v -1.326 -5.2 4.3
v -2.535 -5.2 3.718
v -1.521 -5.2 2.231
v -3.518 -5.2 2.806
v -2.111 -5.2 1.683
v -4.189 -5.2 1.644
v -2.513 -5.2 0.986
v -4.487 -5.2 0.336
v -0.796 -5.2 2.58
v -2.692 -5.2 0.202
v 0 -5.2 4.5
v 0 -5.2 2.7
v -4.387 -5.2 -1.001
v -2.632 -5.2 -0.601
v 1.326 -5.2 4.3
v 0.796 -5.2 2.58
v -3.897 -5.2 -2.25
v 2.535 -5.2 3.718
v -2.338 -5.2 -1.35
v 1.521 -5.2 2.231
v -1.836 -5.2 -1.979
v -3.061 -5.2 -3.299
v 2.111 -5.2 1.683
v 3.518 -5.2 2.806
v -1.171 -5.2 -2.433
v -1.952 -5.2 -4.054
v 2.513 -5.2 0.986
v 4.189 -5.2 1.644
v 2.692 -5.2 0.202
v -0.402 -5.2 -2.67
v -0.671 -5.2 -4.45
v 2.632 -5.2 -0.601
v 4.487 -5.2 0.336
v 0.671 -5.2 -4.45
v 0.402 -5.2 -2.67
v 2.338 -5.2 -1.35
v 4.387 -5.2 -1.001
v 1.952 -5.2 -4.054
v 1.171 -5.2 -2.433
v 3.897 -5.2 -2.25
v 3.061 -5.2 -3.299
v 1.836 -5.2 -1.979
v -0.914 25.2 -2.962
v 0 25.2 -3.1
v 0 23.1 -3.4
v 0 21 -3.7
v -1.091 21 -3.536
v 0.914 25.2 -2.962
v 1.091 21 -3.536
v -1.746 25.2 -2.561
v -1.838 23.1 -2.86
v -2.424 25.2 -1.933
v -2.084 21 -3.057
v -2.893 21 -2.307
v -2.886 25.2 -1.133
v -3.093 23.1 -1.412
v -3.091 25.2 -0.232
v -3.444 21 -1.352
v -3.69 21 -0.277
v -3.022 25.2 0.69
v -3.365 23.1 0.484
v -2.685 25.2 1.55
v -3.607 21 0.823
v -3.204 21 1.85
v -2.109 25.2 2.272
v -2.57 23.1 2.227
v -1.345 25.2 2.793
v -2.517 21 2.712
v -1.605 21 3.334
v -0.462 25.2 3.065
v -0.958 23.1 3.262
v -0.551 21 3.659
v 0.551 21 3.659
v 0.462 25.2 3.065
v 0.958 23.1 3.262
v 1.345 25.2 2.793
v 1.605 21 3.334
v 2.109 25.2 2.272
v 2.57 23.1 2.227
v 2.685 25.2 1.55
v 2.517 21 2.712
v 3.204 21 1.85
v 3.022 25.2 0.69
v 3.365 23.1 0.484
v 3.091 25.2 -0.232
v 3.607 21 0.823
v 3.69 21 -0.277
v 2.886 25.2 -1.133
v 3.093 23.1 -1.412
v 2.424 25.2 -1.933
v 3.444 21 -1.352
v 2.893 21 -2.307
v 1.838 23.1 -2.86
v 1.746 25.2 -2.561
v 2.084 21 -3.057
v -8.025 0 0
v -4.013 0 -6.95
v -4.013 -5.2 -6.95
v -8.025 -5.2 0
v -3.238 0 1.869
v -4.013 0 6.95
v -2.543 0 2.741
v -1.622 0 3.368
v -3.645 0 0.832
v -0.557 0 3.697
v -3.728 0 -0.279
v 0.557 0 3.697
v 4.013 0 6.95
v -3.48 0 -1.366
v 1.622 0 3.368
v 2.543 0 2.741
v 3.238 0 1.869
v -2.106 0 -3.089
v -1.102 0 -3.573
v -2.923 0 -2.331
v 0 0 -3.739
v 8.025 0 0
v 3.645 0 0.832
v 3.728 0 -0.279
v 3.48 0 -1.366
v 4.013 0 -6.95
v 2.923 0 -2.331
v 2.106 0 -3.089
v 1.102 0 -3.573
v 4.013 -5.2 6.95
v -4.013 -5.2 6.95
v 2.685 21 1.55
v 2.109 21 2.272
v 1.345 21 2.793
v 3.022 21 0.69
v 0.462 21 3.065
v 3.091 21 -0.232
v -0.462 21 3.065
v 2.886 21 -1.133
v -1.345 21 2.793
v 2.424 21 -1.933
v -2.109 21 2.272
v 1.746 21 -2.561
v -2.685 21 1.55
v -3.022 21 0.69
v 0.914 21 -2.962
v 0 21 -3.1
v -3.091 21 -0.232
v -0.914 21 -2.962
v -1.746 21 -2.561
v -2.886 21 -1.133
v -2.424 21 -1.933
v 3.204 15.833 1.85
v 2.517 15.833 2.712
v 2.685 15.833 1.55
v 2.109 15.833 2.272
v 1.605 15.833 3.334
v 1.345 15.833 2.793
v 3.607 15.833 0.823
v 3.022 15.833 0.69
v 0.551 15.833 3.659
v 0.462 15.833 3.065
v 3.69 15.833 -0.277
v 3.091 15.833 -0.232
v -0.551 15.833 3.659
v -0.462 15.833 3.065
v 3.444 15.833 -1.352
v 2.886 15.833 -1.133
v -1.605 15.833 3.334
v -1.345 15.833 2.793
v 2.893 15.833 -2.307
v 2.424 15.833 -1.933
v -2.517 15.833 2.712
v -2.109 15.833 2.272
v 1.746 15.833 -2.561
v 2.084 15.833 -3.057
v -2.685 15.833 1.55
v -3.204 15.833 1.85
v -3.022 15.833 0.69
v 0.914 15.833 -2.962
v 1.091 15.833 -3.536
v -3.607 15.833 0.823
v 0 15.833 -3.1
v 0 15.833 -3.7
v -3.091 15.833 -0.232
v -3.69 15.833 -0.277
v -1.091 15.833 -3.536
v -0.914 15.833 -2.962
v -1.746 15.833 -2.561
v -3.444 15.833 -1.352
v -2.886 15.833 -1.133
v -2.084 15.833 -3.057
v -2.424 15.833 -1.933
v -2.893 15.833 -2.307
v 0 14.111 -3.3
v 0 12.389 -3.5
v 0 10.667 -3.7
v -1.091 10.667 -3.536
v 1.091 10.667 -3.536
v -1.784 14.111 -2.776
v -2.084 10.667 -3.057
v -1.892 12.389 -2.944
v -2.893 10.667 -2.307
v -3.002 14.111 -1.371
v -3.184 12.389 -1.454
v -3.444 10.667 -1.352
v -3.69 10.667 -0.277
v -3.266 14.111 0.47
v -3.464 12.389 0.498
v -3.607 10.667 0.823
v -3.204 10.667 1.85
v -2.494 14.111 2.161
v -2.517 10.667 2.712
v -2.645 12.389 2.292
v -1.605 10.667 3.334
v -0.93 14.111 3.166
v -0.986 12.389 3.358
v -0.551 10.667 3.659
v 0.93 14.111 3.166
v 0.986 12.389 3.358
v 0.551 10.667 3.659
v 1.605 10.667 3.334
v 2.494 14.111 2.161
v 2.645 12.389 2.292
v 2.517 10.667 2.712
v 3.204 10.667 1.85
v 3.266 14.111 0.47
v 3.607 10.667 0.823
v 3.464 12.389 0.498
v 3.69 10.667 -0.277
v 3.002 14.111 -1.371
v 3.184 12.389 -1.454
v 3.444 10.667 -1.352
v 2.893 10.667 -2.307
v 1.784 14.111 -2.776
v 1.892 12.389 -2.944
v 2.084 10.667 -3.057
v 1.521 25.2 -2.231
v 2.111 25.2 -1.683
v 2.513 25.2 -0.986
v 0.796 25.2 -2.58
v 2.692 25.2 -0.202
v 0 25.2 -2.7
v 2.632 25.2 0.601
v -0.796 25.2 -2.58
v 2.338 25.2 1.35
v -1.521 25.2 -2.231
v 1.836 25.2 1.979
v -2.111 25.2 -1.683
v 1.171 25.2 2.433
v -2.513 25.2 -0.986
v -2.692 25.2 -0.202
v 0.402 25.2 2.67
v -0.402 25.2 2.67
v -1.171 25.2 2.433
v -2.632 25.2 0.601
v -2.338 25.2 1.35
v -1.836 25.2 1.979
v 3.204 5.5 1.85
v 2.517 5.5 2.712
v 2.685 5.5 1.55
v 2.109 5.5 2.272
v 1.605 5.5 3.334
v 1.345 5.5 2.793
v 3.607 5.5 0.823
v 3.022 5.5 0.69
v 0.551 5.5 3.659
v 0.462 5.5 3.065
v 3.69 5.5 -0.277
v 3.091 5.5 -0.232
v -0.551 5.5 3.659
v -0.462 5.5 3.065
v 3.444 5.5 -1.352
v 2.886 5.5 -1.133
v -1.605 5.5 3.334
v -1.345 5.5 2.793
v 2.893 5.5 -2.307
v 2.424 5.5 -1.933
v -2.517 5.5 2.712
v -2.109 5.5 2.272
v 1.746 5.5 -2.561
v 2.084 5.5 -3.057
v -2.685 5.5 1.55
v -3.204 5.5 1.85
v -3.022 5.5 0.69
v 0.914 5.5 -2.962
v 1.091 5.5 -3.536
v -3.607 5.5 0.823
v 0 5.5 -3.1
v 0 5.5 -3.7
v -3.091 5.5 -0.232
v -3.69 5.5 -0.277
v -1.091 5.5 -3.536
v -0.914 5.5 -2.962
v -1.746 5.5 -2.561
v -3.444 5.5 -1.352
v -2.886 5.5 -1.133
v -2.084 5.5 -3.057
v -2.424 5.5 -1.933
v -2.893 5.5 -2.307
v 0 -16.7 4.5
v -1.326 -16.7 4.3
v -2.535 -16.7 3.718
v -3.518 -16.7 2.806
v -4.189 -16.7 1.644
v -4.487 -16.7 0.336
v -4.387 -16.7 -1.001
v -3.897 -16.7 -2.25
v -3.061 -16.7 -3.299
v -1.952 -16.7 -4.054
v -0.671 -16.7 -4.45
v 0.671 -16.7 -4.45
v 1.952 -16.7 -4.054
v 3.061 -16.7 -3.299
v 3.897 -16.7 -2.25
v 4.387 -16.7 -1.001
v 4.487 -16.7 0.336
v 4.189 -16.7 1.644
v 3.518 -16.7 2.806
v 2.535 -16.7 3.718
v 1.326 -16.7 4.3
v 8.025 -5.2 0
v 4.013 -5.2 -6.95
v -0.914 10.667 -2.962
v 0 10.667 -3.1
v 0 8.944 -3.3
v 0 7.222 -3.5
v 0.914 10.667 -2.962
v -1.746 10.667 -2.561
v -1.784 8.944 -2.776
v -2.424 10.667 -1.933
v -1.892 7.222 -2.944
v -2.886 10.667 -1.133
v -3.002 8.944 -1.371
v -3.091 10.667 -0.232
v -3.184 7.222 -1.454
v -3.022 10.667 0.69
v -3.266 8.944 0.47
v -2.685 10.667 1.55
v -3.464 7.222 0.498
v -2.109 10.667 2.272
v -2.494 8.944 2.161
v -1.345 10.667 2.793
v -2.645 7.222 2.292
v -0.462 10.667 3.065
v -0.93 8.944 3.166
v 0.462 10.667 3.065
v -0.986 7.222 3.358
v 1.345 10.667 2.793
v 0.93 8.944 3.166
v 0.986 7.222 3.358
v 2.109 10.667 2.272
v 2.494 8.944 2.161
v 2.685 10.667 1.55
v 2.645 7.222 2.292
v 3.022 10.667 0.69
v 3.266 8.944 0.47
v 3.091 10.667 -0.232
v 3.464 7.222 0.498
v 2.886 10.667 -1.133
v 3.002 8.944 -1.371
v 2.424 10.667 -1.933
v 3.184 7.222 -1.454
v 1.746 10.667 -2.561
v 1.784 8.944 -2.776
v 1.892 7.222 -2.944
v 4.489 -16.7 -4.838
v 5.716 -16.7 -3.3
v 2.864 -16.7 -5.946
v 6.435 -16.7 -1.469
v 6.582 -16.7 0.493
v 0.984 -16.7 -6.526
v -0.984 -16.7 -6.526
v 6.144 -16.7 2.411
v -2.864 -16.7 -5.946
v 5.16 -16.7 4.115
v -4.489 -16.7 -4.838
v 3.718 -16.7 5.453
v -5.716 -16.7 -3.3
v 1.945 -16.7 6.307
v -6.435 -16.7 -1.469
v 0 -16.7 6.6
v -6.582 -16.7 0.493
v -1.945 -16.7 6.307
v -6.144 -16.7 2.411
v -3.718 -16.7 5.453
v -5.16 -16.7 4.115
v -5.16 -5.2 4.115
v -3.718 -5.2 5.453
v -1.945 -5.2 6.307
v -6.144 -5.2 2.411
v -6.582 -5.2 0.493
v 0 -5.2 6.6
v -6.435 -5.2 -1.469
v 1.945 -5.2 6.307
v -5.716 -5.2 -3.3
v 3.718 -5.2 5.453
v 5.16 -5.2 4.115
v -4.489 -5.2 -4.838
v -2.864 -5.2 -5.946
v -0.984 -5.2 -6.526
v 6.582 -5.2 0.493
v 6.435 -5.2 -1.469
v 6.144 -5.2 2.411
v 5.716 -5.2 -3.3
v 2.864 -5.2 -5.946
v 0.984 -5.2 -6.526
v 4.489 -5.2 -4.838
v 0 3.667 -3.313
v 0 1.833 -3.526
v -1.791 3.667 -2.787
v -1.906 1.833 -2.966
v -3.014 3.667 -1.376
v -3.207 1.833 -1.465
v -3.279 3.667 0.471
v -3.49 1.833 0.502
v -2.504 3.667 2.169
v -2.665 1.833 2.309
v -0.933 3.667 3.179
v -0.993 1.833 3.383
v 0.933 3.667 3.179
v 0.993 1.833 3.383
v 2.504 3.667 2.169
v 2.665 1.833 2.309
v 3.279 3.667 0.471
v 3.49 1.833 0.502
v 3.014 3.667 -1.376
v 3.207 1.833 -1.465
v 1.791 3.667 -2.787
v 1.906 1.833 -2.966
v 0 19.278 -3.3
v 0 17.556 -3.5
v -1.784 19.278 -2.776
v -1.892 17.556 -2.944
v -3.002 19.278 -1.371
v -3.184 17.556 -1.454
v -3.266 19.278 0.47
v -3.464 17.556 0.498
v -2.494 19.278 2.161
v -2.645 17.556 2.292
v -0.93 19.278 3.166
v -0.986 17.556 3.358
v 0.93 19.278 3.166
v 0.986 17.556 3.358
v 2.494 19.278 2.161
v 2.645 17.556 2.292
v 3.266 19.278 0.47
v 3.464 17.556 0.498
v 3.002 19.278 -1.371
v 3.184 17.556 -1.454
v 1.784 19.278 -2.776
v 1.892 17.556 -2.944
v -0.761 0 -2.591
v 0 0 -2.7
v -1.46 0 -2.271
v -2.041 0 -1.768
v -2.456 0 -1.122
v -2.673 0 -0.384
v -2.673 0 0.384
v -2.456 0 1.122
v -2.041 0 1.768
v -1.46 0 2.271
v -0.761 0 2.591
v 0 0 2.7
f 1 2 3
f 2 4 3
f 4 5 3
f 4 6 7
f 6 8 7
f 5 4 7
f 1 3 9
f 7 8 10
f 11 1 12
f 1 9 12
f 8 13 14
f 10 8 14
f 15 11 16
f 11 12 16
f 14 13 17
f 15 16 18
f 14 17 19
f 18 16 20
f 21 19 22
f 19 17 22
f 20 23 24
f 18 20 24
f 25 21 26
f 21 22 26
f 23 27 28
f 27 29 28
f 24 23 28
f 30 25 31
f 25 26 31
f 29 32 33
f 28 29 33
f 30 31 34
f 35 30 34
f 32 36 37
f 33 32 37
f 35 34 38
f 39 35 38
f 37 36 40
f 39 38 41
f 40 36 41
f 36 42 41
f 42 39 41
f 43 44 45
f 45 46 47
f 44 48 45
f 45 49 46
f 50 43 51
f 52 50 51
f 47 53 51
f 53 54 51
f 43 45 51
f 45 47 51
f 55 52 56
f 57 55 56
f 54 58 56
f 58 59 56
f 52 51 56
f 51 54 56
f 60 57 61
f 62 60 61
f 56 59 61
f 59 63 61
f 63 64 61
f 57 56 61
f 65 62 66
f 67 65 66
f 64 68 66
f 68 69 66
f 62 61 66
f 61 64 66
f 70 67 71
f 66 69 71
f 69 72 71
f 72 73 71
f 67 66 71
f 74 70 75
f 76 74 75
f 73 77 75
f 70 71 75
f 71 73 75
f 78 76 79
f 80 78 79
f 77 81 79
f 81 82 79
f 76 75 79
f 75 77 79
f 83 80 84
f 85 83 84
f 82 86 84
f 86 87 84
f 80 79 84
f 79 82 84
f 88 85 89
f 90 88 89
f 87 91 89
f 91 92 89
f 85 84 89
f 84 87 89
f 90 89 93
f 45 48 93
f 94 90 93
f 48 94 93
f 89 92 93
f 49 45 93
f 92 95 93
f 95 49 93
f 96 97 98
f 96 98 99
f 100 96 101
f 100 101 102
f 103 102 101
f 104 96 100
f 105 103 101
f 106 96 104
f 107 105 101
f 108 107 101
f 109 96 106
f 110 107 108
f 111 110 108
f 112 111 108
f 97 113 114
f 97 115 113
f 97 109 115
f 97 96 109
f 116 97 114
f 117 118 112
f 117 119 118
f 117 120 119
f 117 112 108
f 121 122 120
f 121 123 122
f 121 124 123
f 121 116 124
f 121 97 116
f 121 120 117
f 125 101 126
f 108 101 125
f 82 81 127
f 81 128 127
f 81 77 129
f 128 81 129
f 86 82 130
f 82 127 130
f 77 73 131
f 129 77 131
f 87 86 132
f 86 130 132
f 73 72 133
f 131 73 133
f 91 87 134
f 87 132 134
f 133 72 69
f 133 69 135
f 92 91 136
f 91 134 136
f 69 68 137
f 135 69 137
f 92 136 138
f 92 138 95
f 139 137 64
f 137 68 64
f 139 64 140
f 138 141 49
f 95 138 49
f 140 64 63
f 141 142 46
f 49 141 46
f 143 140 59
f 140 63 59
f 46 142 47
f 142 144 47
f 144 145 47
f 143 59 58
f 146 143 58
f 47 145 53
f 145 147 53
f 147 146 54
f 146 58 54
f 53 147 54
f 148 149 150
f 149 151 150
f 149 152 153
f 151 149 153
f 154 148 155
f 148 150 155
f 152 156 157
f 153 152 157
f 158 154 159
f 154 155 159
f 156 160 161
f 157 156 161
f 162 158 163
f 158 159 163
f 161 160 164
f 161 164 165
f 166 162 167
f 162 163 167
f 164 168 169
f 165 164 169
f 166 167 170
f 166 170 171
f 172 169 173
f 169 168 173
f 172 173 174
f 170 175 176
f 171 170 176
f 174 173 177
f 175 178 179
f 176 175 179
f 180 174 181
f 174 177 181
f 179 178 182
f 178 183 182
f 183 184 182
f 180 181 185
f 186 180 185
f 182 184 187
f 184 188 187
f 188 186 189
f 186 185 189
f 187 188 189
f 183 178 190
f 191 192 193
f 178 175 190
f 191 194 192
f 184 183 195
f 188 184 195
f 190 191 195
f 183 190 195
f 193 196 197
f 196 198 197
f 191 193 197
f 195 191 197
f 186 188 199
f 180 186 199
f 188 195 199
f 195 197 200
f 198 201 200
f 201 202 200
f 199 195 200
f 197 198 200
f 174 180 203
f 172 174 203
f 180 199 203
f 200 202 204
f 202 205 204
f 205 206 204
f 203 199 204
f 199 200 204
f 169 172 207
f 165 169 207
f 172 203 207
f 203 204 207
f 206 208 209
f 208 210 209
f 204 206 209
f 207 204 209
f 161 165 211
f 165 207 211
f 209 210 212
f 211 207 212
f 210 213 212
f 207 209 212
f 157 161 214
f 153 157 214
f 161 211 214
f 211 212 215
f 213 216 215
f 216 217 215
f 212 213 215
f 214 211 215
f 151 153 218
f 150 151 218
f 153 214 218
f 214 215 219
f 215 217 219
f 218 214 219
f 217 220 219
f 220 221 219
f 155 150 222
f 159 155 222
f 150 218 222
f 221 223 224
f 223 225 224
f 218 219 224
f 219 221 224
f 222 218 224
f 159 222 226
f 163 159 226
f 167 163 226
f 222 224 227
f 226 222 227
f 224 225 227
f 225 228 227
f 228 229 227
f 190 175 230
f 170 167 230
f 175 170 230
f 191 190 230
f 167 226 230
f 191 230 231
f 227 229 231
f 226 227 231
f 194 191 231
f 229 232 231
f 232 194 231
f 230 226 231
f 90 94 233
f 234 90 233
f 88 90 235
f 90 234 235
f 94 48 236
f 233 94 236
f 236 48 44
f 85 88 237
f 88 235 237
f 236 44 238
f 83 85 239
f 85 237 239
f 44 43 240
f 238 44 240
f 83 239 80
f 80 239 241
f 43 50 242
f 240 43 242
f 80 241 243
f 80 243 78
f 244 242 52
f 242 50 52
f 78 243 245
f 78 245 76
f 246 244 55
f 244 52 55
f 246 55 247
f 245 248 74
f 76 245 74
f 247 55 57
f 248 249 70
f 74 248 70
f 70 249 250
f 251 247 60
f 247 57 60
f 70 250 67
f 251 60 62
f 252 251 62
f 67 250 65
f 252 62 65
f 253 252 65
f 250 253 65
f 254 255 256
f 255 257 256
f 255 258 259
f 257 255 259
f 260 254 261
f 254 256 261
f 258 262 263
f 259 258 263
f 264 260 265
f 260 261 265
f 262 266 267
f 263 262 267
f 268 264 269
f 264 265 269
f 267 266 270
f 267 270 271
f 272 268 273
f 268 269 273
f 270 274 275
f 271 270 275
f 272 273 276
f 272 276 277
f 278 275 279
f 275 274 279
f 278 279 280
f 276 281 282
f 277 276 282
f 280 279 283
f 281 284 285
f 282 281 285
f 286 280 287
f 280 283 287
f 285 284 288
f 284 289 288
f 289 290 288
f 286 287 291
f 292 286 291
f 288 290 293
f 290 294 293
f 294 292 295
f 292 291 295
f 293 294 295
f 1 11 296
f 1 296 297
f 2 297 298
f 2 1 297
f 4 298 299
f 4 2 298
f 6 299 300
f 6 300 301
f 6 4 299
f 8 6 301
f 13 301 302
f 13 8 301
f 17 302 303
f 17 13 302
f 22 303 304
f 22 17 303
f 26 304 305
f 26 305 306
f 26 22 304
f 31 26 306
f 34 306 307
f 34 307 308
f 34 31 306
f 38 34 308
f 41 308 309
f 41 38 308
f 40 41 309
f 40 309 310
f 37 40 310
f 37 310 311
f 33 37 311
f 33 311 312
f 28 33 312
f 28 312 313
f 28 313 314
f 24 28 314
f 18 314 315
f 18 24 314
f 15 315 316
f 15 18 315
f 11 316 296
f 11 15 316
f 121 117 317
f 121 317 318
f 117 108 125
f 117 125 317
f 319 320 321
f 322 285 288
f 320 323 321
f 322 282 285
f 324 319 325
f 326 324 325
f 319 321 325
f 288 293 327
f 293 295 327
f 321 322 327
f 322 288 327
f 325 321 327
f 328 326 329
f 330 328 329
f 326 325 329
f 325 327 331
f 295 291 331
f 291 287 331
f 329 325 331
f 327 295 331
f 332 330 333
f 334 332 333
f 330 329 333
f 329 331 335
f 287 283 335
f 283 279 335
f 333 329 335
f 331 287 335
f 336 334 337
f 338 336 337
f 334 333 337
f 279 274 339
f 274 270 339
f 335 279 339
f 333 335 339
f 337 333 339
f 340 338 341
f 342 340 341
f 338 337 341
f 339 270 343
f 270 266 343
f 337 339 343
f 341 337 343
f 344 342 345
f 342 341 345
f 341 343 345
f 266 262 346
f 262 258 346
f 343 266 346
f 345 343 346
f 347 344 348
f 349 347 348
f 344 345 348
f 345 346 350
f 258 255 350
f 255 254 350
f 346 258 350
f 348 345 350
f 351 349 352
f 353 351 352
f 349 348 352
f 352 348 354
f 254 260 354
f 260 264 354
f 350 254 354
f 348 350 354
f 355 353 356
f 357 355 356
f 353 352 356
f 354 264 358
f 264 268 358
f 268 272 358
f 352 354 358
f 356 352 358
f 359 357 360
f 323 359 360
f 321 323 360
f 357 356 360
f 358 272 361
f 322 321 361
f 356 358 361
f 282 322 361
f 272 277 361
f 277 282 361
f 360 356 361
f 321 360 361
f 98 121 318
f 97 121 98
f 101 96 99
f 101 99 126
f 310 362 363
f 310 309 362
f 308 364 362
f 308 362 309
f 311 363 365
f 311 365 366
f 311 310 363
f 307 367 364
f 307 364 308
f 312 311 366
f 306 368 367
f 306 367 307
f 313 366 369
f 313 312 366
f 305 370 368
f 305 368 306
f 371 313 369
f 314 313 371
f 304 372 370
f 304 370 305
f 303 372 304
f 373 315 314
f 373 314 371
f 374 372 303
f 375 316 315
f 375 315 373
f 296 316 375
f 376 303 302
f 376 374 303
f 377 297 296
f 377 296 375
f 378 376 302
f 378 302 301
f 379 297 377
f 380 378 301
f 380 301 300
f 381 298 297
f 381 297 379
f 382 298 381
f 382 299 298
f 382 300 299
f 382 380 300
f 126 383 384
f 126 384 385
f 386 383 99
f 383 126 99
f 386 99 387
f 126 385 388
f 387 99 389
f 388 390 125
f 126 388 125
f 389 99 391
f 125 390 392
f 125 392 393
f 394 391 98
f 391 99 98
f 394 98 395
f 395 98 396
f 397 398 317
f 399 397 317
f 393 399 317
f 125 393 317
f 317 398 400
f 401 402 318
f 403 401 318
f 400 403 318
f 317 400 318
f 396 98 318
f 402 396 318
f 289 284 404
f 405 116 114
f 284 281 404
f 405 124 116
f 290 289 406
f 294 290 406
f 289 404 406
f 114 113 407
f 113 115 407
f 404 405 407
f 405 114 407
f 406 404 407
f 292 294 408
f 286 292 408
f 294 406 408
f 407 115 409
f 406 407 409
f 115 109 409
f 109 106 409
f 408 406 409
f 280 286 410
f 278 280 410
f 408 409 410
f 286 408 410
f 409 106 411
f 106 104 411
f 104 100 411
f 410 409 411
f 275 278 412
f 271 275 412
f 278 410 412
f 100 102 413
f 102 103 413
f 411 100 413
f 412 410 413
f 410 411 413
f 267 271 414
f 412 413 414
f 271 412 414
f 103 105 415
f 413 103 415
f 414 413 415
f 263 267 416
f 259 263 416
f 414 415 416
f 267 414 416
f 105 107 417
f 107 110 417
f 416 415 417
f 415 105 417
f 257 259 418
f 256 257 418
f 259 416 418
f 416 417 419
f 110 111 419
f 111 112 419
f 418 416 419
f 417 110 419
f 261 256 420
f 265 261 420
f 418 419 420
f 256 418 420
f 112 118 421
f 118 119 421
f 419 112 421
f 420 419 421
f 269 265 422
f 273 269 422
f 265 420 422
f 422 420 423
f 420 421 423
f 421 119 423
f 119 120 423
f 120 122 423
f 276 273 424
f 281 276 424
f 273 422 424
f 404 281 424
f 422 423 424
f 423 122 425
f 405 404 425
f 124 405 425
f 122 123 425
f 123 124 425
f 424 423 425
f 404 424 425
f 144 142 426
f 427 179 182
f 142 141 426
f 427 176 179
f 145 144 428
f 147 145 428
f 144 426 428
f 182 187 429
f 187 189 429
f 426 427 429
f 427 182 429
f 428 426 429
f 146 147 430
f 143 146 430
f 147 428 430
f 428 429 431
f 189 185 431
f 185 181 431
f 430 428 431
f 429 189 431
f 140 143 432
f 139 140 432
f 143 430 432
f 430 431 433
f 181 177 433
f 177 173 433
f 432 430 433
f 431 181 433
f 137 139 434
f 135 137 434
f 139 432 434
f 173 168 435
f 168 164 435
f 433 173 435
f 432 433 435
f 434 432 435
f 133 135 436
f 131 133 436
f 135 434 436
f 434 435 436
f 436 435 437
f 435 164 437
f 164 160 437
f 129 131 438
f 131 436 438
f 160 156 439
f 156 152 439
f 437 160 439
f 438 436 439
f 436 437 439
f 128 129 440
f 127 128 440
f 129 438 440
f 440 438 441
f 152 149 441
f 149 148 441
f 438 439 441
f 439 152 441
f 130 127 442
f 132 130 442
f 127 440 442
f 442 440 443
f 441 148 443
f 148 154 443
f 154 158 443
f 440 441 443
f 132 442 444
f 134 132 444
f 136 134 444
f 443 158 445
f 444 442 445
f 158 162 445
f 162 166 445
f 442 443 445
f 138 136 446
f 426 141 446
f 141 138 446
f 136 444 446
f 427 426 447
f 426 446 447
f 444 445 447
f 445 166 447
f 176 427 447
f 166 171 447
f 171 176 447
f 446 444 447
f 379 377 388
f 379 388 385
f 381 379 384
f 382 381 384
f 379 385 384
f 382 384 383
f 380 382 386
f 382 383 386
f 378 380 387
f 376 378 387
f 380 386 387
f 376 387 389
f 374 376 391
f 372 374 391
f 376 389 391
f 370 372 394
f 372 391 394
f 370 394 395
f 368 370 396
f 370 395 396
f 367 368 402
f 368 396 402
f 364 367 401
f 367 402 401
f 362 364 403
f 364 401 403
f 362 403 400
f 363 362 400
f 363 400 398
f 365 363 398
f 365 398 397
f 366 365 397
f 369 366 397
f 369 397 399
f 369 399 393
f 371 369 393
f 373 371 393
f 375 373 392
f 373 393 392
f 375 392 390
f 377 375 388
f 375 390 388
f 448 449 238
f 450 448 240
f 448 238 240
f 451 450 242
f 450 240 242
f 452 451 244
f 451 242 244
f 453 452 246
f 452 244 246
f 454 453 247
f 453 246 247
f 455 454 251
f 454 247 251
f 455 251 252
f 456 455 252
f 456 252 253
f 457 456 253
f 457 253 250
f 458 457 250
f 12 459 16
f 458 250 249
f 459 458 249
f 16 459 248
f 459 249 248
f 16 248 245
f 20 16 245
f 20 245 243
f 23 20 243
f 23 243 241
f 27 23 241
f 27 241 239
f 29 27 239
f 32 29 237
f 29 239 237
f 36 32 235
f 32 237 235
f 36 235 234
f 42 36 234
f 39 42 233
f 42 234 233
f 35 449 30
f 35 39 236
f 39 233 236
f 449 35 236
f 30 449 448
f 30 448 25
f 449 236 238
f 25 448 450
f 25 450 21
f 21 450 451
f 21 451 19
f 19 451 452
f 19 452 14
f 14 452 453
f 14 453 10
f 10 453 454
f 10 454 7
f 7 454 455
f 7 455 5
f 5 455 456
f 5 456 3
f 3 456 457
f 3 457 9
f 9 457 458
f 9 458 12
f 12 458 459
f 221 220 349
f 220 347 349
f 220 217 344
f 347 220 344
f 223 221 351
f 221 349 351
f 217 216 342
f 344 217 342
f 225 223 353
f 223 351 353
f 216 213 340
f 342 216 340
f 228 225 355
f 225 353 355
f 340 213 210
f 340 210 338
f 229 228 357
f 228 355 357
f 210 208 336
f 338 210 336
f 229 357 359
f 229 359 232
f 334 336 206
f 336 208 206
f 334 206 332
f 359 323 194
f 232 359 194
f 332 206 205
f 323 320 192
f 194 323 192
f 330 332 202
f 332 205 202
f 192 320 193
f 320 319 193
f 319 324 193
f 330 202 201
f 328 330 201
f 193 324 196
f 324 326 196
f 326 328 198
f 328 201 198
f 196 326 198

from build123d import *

# Parameters (mm, degrees)
SKETCH1_R           = 2.7
BOSS_EXTRUDE1_DEPTH = 5.2
LOWER_THREADS_R     = 6.6
LOWER_THREADS_R_2   = 4.5
BOSS_EXTRUDE2_DEPTH = 11.5


with BuildPart() as part:
    # Sketch1 → Boss-Extrude1 (new body)
    with BuildSketch(Plane(origin=(0, 0, 0), x_dir=(1, 0, 0), z_dir=(0, 1, 0))):
        Polygon((8.025168742, 0), (4.012584371, 6.95), (-4.012584371, 6.95), (-8.025168742, 0), (-4.012584371, -6.95), (4.012584371, -6.95), align=None)
        with Locations(Location((0, 0, 0), (0, 0, 270))):
            Circle(SKETCH1_R, mode=Mode.SUBTRACT)
    extrude(amount=-BOSS_EXTRUDE1_DEPTH)

    # Sketch2 → Revolve1 (revolve)
    with BuildSketch(Plane.XY, mode=Mode.PRIVATE) as revolve1_sk:
        Polygon((2.7, 0), (2.7, 25.2), (3.1, 25.2), (3.7, 21), (3.1, 21), (3.7, 15.833333333), (3.1, 15.833333333), (3.7, 10.666666667), (3.1, 10.666666667), (3.7, 5.5), (3.1, 5.5), (3.738709677, 0), align=None)
    revolve(revolve1_sk.sketch.rotate(Axis((0, -1.995266411, 0), (0, 1, 0)), 90), axis=Axis((0, -1.995266411, 0), (0, 1, 0)))

    # Lower Threads → Boss-Extrude2 (add)
    with BuildSketch(Plane.XZ.offset(5.2)):
        with Locations(Location((0, 0, 0), (0, 0, 90))):
            Circle(LOWER_THREADS_R)
        with Locations(Location((0, 0, 0), (0, 0, 90))):
            Circle(LOWER_THREADS_R_2, mode=Mode.SUBTRACT)
    extrude(amount=BOSS_EXTRUDE2_DEPTH)


solid = part.part
